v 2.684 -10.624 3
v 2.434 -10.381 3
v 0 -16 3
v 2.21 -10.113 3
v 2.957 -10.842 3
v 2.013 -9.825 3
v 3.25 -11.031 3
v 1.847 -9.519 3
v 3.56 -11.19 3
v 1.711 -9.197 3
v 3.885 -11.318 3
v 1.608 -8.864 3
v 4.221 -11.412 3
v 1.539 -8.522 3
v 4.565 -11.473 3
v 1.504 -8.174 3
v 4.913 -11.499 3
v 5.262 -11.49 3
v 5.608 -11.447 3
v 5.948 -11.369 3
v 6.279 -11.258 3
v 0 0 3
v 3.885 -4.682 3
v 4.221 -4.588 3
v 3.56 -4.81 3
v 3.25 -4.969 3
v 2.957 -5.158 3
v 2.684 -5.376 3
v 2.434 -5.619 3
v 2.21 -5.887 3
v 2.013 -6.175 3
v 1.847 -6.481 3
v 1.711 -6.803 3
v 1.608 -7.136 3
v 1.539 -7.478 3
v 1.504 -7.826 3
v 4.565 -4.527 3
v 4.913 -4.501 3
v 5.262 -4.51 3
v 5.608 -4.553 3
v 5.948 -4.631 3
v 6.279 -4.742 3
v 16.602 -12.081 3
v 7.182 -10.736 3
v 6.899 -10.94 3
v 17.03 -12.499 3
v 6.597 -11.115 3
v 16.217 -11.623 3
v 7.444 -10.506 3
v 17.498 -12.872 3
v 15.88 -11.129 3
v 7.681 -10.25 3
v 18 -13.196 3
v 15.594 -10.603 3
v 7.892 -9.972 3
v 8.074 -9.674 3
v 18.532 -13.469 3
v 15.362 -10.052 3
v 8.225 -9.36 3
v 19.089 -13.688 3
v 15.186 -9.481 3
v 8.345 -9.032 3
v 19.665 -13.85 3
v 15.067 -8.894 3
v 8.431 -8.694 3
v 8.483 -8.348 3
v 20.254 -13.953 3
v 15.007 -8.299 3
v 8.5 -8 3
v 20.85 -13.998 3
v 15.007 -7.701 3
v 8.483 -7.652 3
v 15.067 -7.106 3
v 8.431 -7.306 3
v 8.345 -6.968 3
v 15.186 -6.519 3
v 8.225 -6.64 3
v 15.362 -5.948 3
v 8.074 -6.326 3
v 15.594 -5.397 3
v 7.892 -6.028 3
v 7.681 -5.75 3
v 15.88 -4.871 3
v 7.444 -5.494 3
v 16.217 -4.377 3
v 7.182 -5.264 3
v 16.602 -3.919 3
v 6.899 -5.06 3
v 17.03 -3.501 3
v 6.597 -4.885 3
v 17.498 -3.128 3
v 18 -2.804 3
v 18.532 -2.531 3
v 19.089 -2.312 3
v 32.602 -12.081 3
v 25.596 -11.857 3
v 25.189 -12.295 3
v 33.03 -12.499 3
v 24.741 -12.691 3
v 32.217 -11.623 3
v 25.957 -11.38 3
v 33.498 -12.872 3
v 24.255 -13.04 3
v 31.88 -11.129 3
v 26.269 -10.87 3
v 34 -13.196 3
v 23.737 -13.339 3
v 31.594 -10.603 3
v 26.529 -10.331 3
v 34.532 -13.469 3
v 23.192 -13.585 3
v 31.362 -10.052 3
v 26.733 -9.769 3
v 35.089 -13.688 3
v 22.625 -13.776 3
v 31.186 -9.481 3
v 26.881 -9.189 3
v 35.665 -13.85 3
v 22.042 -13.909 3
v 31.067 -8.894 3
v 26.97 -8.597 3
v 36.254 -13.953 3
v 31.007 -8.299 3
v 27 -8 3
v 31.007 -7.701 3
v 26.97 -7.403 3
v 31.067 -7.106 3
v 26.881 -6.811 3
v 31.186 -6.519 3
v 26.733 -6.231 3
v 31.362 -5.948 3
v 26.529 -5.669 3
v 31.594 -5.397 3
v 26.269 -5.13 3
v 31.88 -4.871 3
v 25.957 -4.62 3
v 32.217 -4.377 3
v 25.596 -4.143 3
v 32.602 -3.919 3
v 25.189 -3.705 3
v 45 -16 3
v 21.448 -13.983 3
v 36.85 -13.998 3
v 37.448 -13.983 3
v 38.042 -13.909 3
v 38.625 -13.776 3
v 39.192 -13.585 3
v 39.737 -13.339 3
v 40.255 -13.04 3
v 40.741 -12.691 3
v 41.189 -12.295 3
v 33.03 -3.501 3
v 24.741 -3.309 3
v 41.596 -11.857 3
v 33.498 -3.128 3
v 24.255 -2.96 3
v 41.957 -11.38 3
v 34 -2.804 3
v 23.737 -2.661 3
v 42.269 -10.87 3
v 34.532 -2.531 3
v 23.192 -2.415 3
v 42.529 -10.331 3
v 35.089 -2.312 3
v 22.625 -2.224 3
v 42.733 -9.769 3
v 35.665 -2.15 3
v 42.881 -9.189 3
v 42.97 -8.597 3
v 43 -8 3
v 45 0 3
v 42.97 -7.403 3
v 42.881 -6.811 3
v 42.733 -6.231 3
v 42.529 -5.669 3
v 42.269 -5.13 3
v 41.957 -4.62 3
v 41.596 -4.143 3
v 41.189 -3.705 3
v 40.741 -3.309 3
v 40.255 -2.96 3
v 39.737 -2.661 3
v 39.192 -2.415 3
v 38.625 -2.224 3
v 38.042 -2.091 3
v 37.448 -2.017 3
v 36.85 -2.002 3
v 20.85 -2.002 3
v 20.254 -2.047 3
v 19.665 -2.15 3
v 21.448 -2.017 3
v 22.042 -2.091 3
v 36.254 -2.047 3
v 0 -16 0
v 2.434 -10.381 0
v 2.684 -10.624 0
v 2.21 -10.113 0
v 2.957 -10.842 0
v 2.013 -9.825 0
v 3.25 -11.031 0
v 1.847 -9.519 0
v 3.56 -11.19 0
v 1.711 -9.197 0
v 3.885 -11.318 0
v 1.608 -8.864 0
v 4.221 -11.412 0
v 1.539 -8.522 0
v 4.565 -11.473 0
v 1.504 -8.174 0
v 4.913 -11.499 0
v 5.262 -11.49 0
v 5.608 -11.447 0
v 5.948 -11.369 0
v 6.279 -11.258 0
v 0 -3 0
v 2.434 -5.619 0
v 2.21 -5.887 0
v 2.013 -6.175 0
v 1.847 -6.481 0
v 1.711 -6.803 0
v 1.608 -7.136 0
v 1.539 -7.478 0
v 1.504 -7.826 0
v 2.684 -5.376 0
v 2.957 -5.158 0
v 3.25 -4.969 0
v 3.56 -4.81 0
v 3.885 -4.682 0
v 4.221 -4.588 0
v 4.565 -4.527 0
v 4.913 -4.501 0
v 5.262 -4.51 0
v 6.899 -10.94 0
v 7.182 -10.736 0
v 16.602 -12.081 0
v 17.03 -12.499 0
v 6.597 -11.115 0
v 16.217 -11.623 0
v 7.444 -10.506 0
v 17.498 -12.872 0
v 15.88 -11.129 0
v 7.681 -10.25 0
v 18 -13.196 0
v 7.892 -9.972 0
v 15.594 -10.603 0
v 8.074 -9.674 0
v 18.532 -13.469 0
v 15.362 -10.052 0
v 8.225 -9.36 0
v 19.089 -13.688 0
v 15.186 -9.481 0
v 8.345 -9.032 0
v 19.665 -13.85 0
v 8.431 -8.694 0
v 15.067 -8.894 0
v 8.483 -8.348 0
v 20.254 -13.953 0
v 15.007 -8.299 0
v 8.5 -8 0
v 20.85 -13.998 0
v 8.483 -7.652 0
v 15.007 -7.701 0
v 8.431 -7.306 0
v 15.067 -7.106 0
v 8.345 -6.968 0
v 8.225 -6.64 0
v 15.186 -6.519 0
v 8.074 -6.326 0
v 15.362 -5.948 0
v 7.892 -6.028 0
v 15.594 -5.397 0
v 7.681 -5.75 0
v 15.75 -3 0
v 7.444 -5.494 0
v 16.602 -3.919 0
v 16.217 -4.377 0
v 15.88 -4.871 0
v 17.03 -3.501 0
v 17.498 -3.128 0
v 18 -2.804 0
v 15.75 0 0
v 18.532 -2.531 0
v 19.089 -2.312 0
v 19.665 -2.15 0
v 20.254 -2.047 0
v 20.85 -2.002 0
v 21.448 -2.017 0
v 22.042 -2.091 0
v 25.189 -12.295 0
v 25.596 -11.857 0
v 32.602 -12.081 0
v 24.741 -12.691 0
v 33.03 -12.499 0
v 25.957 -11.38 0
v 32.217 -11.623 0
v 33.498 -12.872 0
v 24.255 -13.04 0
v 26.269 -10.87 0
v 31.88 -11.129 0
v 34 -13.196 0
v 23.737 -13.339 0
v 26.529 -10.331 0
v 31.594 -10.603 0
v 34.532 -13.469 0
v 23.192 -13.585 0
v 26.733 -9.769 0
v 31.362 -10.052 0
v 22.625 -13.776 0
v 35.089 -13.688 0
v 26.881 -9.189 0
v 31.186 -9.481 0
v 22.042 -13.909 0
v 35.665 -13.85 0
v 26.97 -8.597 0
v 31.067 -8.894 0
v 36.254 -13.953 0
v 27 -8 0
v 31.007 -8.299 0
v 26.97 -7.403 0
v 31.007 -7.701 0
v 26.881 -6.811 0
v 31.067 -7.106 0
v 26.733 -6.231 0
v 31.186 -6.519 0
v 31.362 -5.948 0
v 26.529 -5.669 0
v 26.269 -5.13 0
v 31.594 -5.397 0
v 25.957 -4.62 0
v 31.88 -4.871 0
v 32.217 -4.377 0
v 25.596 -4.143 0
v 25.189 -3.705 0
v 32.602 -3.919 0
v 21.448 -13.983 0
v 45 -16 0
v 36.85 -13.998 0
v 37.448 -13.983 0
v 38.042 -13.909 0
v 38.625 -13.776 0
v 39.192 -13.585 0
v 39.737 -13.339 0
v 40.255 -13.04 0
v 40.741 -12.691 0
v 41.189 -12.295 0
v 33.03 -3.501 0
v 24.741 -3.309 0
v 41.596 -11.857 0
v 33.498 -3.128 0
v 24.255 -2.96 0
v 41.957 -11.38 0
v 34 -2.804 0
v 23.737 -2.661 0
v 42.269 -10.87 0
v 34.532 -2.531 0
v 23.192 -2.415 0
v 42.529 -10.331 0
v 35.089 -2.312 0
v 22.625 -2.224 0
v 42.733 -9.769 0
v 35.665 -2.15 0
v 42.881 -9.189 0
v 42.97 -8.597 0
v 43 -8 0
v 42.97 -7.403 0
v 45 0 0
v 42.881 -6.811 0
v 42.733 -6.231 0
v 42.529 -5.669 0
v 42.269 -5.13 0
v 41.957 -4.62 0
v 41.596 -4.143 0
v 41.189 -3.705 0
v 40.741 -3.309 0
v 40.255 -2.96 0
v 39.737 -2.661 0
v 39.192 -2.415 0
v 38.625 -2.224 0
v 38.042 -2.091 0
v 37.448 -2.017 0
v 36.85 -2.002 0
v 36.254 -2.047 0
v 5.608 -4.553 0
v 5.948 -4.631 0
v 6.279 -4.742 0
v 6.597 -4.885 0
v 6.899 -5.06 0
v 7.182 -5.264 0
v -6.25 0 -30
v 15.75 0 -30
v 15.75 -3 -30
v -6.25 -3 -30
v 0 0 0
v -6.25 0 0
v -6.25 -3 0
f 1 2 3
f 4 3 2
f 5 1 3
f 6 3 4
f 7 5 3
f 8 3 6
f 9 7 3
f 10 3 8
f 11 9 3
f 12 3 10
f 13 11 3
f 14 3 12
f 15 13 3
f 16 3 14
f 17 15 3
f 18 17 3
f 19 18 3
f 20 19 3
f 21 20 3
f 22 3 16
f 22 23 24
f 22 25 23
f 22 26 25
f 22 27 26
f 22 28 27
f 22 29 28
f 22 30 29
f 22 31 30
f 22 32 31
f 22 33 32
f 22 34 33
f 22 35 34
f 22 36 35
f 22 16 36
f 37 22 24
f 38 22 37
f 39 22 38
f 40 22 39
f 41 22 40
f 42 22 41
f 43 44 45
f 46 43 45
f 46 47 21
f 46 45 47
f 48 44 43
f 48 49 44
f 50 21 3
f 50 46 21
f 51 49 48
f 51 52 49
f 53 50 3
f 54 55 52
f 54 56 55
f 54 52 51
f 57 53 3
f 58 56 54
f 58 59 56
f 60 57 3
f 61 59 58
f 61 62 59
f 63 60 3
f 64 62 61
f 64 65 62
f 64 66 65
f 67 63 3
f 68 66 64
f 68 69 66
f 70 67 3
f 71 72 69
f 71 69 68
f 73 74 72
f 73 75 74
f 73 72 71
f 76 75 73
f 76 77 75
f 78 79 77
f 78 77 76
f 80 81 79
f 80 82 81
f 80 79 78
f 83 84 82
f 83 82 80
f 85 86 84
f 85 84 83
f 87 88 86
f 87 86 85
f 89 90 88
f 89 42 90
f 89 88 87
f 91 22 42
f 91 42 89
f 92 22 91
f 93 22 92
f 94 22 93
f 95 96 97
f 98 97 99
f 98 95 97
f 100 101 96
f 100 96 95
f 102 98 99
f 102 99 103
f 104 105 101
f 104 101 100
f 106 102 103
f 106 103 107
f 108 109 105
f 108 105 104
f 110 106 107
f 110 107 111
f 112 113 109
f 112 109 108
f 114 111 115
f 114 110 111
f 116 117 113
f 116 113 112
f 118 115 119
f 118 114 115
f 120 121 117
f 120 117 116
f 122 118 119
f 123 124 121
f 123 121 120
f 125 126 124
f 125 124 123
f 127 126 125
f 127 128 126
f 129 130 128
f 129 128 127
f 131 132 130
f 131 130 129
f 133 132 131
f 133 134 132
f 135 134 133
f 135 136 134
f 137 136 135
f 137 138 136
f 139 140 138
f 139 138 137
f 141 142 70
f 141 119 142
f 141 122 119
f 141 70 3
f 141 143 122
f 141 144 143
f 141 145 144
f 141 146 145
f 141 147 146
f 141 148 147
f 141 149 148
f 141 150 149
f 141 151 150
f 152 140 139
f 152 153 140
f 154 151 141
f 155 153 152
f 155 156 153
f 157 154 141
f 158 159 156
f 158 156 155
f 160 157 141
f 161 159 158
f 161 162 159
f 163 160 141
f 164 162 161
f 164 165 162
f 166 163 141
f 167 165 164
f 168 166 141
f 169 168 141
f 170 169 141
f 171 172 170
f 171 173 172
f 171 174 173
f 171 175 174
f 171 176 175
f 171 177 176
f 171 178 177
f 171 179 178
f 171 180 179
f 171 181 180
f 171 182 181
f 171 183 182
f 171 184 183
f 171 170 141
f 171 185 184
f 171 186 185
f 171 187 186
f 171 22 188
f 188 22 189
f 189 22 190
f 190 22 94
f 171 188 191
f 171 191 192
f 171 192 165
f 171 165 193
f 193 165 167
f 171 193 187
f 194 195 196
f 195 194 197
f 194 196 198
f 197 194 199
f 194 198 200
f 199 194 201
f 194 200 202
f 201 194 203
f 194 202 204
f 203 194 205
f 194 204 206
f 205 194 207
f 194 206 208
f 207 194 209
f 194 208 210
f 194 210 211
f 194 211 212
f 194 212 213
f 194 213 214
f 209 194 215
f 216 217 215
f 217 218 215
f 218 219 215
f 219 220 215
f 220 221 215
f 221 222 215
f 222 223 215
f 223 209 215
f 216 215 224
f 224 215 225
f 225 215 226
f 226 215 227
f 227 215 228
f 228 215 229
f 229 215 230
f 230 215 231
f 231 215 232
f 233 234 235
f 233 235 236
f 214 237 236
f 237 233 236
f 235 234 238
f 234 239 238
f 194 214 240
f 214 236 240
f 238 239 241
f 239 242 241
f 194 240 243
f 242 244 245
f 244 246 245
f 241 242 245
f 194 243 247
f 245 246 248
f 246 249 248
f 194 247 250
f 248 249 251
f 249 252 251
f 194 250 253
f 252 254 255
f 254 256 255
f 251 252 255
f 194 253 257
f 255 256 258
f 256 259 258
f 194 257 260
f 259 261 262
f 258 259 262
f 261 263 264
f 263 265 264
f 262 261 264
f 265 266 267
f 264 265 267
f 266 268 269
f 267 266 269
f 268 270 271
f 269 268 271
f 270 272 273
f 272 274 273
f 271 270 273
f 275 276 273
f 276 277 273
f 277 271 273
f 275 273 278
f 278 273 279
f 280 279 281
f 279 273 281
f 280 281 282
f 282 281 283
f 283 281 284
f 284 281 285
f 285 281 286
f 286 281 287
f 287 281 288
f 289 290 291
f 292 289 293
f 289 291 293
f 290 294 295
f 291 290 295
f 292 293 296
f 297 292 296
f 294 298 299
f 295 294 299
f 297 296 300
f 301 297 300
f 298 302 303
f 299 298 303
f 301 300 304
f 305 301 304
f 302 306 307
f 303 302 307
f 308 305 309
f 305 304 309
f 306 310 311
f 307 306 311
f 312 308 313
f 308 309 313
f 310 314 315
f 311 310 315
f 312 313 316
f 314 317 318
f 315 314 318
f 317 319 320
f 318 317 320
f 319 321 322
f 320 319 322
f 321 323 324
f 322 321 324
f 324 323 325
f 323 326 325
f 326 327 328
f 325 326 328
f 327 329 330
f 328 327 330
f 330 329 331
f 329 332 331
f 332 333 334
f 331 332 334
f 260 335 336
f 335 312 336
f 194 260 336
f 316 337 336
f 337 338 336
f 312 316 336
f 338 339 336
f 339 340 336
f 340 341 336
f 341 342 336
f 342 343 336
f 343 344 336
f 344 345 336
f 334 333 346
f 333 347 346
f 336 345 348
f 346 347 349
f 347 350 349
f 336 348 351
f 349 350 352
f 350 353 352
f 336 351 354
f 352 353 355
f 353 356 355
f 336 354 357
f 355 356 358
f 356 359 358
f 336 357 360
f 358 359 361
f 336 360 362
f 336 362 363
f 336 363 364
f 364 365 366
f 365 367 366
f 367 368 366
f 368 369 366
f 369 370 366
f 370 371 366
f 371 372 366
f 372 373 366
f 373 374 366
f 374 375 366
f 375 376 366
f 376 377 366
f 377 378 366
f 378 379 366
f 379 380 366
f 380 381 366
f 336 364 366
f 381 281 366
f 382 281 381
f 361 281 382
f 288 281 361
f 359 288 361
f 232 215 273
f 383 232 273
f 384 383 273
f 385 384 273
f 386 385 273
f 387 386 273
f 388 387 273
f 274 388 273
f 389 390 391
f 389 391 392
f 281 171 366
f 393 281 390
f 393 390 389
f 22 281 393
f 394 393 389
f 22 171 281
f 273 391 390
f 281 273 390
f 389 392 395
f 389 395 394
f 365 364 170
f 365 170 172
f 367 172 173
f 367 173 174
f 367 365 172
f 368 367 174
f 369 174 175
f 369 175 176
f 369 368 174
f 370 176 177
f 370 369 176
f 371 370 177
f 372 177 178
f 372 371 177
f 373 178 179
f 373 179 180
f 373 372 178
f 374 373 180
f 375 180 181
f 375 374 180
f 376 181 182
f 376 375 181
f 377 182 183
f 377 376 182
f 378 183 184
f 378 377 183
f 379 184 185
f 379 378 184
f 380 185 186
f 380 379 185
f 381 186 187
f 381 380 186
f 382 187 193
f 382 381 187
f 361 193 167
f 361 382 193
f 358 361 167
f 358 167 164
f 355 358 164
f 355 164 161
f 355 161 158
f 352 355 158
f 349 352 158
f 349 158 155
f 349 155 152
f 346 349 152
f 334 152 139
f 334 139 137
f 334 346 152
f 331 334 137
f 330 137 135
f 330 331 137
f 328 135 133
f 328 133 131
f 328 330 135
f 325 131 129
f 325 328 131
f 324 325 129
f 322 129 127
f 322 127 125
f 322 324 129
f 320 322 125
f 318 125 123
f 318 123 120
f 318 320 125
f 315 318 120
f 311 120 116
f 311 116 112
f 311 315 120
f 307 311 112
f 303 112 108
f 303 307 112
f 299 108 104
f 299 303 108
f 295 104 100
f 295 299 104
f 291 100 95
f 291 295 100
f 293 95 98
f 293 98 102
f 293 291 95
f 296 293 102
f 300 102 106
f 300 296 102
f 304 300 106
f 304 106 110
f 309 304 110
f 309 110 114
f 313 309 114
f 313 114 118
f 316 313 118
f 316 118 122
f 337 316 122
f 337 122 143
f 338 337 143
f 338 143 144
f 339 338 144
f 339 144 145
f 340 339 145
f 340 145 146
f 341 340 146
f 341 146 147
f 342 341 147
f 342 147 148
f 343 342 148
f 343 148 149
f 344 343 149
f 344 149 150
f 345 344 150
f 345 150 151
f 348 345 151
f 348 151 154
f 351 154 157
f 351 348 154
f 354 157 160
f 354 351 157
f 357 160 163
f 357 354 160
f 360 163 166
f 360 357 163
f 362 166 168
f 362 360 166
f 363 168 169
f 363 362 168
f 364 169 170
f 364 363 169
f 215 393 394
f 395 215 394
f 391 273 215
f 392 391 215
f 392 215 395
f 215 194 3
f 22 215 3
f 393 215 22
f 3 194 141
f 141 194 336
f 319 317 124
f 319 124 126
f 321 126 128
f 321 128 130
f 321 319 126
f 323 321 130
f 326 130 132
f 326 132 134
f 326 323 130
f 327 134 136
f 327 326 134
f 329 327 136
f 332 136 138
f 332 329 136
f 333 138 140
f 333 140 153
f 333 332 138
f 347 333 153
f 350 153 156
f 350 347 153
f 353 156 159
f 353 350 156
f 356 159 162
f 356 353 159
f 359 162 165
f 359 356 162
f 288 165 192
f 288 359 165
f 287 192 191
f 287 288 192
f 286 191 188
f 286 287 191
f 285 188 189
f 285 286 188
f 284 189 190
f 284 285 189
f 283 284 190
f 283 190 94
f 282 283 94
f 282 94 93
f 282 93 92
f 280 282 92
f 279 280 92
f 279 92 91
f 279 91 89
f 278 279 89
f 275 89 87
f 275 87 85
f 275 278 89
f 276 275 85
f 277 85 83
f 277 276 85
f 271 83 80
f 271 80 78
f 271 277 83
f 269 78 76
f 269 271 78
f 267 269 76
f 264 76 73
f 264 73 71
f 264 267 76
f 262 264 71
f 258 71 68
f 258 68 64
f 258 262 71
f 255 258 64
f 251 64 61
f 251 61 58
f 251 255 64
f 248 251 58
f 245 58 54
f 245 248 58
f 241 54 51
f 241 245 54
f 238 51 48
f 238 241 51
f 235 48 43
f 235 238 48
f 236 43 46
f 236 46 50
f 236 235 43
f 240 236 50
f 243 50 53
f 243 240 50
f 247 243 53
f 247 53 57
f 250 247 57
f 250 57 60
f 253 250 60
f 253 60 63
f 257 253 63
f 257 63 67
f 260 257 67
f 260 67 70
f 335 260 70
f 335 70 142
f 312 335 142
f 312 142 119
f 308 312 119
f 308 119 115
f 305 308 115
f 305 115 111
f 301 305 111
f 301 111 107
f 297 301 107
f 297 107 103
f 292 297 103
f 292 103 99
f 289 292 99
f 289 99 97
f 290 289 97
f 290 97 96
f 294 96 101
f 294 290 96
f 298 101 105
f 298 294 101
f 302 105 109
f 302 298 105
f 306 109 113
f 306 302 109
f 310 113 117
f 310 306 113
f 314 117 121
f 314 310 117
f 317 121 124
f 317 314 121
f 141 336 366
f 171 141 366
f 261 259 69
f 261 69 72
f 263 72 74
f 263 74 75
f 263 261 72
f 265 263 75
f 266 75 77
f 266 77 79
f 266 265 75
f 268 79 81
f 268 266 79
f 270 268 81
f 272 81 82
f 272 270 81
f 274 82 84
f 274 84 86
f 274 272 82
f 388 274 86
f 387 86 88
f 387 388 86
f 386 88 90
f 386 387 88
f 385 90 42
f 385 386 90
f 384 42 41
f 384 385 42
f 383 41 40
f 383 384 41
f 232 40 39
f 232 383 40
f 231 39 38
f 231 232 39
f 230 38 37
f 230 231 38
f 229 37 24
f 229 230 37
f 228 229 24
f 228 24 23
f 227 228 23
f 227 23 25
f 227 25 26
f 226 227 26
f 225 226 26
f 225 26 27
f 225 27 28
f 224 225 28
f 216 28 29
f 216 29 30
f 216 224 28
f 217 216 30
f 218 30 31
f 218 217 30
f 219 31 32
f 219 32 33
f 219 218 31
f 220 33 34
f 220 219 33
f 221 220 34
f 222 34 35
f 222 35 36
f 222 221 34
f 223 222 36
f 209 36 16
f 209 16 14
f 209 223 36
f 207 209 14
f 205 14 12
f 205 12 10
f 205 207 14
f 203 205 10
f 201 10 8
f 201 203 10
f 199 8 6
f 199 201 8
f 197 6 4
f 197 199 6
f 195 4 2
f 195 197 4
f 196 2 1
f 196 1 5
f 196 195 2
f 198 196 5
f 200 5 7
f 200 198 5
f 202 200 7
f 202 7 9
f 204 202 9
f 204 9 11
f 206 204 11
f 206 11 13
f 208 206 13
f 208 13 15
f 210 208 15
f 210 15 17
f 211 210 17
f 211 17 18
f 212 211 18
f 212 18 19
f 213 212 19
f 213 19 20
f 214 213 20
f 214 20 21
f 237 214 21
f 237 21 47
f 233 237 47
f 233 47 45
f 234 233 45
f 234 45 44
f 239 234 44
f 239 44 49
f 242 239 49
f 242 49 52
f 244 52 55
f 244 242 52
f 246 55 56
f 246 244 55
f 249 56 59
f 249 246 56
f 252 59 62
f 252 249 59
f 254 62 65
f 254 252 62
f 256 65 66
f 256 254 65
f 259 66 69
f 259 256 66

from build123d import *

# Parameters (mm, degrees)
SKETCH1_W           = 45
SKETCH1_H           = 16
SKETCH1_R           = 3.5
SKETCH1_R_2         = 6
BOSS_EXTRUDE1_DEPTH = 3
SKETCH3_W           = 22
SKETCH3_H           = 3
BOSS_EXTRUDE3_DEPTH = 30


with BuildPart() as part:
    # Sketch1 → Boss-Extrude1 (new body)
    with BuildSketch(Plane.XY):
        with Locations((22.5, -8)):
            Rectangle(SKETCH1_W, SKETCH1_H)
        with Locations((5, -8)):
            Circle(SKETCH1_R, mode=Mode.SUBTRACT)
        with Locations((21, -8)):
            Circle(SKETCH1_R_2, mode=Mode.SUBTRACT)
        with Locations((37, -8)):
            Circle(SKETCH1_R_2, mode=Mode.SUBTRACT)
    extrude(amount=BOSS_EXTRUDE1_DEPTH)

    # Sketch3 → Boss-Extrude3 (add)
    with BuildSketch(Plane(origin=(0, 0, 0), x_dir=(-1, 0, 0), z_dir=(0, 0, -1))):
        with Locations((-4.75, -1.5)):
            Rectangle(SKETCH3_W, SKETCH3_H)
    extrude(amount=BOSS_EXTRUDE3_DEPTH)


solid = part.part
